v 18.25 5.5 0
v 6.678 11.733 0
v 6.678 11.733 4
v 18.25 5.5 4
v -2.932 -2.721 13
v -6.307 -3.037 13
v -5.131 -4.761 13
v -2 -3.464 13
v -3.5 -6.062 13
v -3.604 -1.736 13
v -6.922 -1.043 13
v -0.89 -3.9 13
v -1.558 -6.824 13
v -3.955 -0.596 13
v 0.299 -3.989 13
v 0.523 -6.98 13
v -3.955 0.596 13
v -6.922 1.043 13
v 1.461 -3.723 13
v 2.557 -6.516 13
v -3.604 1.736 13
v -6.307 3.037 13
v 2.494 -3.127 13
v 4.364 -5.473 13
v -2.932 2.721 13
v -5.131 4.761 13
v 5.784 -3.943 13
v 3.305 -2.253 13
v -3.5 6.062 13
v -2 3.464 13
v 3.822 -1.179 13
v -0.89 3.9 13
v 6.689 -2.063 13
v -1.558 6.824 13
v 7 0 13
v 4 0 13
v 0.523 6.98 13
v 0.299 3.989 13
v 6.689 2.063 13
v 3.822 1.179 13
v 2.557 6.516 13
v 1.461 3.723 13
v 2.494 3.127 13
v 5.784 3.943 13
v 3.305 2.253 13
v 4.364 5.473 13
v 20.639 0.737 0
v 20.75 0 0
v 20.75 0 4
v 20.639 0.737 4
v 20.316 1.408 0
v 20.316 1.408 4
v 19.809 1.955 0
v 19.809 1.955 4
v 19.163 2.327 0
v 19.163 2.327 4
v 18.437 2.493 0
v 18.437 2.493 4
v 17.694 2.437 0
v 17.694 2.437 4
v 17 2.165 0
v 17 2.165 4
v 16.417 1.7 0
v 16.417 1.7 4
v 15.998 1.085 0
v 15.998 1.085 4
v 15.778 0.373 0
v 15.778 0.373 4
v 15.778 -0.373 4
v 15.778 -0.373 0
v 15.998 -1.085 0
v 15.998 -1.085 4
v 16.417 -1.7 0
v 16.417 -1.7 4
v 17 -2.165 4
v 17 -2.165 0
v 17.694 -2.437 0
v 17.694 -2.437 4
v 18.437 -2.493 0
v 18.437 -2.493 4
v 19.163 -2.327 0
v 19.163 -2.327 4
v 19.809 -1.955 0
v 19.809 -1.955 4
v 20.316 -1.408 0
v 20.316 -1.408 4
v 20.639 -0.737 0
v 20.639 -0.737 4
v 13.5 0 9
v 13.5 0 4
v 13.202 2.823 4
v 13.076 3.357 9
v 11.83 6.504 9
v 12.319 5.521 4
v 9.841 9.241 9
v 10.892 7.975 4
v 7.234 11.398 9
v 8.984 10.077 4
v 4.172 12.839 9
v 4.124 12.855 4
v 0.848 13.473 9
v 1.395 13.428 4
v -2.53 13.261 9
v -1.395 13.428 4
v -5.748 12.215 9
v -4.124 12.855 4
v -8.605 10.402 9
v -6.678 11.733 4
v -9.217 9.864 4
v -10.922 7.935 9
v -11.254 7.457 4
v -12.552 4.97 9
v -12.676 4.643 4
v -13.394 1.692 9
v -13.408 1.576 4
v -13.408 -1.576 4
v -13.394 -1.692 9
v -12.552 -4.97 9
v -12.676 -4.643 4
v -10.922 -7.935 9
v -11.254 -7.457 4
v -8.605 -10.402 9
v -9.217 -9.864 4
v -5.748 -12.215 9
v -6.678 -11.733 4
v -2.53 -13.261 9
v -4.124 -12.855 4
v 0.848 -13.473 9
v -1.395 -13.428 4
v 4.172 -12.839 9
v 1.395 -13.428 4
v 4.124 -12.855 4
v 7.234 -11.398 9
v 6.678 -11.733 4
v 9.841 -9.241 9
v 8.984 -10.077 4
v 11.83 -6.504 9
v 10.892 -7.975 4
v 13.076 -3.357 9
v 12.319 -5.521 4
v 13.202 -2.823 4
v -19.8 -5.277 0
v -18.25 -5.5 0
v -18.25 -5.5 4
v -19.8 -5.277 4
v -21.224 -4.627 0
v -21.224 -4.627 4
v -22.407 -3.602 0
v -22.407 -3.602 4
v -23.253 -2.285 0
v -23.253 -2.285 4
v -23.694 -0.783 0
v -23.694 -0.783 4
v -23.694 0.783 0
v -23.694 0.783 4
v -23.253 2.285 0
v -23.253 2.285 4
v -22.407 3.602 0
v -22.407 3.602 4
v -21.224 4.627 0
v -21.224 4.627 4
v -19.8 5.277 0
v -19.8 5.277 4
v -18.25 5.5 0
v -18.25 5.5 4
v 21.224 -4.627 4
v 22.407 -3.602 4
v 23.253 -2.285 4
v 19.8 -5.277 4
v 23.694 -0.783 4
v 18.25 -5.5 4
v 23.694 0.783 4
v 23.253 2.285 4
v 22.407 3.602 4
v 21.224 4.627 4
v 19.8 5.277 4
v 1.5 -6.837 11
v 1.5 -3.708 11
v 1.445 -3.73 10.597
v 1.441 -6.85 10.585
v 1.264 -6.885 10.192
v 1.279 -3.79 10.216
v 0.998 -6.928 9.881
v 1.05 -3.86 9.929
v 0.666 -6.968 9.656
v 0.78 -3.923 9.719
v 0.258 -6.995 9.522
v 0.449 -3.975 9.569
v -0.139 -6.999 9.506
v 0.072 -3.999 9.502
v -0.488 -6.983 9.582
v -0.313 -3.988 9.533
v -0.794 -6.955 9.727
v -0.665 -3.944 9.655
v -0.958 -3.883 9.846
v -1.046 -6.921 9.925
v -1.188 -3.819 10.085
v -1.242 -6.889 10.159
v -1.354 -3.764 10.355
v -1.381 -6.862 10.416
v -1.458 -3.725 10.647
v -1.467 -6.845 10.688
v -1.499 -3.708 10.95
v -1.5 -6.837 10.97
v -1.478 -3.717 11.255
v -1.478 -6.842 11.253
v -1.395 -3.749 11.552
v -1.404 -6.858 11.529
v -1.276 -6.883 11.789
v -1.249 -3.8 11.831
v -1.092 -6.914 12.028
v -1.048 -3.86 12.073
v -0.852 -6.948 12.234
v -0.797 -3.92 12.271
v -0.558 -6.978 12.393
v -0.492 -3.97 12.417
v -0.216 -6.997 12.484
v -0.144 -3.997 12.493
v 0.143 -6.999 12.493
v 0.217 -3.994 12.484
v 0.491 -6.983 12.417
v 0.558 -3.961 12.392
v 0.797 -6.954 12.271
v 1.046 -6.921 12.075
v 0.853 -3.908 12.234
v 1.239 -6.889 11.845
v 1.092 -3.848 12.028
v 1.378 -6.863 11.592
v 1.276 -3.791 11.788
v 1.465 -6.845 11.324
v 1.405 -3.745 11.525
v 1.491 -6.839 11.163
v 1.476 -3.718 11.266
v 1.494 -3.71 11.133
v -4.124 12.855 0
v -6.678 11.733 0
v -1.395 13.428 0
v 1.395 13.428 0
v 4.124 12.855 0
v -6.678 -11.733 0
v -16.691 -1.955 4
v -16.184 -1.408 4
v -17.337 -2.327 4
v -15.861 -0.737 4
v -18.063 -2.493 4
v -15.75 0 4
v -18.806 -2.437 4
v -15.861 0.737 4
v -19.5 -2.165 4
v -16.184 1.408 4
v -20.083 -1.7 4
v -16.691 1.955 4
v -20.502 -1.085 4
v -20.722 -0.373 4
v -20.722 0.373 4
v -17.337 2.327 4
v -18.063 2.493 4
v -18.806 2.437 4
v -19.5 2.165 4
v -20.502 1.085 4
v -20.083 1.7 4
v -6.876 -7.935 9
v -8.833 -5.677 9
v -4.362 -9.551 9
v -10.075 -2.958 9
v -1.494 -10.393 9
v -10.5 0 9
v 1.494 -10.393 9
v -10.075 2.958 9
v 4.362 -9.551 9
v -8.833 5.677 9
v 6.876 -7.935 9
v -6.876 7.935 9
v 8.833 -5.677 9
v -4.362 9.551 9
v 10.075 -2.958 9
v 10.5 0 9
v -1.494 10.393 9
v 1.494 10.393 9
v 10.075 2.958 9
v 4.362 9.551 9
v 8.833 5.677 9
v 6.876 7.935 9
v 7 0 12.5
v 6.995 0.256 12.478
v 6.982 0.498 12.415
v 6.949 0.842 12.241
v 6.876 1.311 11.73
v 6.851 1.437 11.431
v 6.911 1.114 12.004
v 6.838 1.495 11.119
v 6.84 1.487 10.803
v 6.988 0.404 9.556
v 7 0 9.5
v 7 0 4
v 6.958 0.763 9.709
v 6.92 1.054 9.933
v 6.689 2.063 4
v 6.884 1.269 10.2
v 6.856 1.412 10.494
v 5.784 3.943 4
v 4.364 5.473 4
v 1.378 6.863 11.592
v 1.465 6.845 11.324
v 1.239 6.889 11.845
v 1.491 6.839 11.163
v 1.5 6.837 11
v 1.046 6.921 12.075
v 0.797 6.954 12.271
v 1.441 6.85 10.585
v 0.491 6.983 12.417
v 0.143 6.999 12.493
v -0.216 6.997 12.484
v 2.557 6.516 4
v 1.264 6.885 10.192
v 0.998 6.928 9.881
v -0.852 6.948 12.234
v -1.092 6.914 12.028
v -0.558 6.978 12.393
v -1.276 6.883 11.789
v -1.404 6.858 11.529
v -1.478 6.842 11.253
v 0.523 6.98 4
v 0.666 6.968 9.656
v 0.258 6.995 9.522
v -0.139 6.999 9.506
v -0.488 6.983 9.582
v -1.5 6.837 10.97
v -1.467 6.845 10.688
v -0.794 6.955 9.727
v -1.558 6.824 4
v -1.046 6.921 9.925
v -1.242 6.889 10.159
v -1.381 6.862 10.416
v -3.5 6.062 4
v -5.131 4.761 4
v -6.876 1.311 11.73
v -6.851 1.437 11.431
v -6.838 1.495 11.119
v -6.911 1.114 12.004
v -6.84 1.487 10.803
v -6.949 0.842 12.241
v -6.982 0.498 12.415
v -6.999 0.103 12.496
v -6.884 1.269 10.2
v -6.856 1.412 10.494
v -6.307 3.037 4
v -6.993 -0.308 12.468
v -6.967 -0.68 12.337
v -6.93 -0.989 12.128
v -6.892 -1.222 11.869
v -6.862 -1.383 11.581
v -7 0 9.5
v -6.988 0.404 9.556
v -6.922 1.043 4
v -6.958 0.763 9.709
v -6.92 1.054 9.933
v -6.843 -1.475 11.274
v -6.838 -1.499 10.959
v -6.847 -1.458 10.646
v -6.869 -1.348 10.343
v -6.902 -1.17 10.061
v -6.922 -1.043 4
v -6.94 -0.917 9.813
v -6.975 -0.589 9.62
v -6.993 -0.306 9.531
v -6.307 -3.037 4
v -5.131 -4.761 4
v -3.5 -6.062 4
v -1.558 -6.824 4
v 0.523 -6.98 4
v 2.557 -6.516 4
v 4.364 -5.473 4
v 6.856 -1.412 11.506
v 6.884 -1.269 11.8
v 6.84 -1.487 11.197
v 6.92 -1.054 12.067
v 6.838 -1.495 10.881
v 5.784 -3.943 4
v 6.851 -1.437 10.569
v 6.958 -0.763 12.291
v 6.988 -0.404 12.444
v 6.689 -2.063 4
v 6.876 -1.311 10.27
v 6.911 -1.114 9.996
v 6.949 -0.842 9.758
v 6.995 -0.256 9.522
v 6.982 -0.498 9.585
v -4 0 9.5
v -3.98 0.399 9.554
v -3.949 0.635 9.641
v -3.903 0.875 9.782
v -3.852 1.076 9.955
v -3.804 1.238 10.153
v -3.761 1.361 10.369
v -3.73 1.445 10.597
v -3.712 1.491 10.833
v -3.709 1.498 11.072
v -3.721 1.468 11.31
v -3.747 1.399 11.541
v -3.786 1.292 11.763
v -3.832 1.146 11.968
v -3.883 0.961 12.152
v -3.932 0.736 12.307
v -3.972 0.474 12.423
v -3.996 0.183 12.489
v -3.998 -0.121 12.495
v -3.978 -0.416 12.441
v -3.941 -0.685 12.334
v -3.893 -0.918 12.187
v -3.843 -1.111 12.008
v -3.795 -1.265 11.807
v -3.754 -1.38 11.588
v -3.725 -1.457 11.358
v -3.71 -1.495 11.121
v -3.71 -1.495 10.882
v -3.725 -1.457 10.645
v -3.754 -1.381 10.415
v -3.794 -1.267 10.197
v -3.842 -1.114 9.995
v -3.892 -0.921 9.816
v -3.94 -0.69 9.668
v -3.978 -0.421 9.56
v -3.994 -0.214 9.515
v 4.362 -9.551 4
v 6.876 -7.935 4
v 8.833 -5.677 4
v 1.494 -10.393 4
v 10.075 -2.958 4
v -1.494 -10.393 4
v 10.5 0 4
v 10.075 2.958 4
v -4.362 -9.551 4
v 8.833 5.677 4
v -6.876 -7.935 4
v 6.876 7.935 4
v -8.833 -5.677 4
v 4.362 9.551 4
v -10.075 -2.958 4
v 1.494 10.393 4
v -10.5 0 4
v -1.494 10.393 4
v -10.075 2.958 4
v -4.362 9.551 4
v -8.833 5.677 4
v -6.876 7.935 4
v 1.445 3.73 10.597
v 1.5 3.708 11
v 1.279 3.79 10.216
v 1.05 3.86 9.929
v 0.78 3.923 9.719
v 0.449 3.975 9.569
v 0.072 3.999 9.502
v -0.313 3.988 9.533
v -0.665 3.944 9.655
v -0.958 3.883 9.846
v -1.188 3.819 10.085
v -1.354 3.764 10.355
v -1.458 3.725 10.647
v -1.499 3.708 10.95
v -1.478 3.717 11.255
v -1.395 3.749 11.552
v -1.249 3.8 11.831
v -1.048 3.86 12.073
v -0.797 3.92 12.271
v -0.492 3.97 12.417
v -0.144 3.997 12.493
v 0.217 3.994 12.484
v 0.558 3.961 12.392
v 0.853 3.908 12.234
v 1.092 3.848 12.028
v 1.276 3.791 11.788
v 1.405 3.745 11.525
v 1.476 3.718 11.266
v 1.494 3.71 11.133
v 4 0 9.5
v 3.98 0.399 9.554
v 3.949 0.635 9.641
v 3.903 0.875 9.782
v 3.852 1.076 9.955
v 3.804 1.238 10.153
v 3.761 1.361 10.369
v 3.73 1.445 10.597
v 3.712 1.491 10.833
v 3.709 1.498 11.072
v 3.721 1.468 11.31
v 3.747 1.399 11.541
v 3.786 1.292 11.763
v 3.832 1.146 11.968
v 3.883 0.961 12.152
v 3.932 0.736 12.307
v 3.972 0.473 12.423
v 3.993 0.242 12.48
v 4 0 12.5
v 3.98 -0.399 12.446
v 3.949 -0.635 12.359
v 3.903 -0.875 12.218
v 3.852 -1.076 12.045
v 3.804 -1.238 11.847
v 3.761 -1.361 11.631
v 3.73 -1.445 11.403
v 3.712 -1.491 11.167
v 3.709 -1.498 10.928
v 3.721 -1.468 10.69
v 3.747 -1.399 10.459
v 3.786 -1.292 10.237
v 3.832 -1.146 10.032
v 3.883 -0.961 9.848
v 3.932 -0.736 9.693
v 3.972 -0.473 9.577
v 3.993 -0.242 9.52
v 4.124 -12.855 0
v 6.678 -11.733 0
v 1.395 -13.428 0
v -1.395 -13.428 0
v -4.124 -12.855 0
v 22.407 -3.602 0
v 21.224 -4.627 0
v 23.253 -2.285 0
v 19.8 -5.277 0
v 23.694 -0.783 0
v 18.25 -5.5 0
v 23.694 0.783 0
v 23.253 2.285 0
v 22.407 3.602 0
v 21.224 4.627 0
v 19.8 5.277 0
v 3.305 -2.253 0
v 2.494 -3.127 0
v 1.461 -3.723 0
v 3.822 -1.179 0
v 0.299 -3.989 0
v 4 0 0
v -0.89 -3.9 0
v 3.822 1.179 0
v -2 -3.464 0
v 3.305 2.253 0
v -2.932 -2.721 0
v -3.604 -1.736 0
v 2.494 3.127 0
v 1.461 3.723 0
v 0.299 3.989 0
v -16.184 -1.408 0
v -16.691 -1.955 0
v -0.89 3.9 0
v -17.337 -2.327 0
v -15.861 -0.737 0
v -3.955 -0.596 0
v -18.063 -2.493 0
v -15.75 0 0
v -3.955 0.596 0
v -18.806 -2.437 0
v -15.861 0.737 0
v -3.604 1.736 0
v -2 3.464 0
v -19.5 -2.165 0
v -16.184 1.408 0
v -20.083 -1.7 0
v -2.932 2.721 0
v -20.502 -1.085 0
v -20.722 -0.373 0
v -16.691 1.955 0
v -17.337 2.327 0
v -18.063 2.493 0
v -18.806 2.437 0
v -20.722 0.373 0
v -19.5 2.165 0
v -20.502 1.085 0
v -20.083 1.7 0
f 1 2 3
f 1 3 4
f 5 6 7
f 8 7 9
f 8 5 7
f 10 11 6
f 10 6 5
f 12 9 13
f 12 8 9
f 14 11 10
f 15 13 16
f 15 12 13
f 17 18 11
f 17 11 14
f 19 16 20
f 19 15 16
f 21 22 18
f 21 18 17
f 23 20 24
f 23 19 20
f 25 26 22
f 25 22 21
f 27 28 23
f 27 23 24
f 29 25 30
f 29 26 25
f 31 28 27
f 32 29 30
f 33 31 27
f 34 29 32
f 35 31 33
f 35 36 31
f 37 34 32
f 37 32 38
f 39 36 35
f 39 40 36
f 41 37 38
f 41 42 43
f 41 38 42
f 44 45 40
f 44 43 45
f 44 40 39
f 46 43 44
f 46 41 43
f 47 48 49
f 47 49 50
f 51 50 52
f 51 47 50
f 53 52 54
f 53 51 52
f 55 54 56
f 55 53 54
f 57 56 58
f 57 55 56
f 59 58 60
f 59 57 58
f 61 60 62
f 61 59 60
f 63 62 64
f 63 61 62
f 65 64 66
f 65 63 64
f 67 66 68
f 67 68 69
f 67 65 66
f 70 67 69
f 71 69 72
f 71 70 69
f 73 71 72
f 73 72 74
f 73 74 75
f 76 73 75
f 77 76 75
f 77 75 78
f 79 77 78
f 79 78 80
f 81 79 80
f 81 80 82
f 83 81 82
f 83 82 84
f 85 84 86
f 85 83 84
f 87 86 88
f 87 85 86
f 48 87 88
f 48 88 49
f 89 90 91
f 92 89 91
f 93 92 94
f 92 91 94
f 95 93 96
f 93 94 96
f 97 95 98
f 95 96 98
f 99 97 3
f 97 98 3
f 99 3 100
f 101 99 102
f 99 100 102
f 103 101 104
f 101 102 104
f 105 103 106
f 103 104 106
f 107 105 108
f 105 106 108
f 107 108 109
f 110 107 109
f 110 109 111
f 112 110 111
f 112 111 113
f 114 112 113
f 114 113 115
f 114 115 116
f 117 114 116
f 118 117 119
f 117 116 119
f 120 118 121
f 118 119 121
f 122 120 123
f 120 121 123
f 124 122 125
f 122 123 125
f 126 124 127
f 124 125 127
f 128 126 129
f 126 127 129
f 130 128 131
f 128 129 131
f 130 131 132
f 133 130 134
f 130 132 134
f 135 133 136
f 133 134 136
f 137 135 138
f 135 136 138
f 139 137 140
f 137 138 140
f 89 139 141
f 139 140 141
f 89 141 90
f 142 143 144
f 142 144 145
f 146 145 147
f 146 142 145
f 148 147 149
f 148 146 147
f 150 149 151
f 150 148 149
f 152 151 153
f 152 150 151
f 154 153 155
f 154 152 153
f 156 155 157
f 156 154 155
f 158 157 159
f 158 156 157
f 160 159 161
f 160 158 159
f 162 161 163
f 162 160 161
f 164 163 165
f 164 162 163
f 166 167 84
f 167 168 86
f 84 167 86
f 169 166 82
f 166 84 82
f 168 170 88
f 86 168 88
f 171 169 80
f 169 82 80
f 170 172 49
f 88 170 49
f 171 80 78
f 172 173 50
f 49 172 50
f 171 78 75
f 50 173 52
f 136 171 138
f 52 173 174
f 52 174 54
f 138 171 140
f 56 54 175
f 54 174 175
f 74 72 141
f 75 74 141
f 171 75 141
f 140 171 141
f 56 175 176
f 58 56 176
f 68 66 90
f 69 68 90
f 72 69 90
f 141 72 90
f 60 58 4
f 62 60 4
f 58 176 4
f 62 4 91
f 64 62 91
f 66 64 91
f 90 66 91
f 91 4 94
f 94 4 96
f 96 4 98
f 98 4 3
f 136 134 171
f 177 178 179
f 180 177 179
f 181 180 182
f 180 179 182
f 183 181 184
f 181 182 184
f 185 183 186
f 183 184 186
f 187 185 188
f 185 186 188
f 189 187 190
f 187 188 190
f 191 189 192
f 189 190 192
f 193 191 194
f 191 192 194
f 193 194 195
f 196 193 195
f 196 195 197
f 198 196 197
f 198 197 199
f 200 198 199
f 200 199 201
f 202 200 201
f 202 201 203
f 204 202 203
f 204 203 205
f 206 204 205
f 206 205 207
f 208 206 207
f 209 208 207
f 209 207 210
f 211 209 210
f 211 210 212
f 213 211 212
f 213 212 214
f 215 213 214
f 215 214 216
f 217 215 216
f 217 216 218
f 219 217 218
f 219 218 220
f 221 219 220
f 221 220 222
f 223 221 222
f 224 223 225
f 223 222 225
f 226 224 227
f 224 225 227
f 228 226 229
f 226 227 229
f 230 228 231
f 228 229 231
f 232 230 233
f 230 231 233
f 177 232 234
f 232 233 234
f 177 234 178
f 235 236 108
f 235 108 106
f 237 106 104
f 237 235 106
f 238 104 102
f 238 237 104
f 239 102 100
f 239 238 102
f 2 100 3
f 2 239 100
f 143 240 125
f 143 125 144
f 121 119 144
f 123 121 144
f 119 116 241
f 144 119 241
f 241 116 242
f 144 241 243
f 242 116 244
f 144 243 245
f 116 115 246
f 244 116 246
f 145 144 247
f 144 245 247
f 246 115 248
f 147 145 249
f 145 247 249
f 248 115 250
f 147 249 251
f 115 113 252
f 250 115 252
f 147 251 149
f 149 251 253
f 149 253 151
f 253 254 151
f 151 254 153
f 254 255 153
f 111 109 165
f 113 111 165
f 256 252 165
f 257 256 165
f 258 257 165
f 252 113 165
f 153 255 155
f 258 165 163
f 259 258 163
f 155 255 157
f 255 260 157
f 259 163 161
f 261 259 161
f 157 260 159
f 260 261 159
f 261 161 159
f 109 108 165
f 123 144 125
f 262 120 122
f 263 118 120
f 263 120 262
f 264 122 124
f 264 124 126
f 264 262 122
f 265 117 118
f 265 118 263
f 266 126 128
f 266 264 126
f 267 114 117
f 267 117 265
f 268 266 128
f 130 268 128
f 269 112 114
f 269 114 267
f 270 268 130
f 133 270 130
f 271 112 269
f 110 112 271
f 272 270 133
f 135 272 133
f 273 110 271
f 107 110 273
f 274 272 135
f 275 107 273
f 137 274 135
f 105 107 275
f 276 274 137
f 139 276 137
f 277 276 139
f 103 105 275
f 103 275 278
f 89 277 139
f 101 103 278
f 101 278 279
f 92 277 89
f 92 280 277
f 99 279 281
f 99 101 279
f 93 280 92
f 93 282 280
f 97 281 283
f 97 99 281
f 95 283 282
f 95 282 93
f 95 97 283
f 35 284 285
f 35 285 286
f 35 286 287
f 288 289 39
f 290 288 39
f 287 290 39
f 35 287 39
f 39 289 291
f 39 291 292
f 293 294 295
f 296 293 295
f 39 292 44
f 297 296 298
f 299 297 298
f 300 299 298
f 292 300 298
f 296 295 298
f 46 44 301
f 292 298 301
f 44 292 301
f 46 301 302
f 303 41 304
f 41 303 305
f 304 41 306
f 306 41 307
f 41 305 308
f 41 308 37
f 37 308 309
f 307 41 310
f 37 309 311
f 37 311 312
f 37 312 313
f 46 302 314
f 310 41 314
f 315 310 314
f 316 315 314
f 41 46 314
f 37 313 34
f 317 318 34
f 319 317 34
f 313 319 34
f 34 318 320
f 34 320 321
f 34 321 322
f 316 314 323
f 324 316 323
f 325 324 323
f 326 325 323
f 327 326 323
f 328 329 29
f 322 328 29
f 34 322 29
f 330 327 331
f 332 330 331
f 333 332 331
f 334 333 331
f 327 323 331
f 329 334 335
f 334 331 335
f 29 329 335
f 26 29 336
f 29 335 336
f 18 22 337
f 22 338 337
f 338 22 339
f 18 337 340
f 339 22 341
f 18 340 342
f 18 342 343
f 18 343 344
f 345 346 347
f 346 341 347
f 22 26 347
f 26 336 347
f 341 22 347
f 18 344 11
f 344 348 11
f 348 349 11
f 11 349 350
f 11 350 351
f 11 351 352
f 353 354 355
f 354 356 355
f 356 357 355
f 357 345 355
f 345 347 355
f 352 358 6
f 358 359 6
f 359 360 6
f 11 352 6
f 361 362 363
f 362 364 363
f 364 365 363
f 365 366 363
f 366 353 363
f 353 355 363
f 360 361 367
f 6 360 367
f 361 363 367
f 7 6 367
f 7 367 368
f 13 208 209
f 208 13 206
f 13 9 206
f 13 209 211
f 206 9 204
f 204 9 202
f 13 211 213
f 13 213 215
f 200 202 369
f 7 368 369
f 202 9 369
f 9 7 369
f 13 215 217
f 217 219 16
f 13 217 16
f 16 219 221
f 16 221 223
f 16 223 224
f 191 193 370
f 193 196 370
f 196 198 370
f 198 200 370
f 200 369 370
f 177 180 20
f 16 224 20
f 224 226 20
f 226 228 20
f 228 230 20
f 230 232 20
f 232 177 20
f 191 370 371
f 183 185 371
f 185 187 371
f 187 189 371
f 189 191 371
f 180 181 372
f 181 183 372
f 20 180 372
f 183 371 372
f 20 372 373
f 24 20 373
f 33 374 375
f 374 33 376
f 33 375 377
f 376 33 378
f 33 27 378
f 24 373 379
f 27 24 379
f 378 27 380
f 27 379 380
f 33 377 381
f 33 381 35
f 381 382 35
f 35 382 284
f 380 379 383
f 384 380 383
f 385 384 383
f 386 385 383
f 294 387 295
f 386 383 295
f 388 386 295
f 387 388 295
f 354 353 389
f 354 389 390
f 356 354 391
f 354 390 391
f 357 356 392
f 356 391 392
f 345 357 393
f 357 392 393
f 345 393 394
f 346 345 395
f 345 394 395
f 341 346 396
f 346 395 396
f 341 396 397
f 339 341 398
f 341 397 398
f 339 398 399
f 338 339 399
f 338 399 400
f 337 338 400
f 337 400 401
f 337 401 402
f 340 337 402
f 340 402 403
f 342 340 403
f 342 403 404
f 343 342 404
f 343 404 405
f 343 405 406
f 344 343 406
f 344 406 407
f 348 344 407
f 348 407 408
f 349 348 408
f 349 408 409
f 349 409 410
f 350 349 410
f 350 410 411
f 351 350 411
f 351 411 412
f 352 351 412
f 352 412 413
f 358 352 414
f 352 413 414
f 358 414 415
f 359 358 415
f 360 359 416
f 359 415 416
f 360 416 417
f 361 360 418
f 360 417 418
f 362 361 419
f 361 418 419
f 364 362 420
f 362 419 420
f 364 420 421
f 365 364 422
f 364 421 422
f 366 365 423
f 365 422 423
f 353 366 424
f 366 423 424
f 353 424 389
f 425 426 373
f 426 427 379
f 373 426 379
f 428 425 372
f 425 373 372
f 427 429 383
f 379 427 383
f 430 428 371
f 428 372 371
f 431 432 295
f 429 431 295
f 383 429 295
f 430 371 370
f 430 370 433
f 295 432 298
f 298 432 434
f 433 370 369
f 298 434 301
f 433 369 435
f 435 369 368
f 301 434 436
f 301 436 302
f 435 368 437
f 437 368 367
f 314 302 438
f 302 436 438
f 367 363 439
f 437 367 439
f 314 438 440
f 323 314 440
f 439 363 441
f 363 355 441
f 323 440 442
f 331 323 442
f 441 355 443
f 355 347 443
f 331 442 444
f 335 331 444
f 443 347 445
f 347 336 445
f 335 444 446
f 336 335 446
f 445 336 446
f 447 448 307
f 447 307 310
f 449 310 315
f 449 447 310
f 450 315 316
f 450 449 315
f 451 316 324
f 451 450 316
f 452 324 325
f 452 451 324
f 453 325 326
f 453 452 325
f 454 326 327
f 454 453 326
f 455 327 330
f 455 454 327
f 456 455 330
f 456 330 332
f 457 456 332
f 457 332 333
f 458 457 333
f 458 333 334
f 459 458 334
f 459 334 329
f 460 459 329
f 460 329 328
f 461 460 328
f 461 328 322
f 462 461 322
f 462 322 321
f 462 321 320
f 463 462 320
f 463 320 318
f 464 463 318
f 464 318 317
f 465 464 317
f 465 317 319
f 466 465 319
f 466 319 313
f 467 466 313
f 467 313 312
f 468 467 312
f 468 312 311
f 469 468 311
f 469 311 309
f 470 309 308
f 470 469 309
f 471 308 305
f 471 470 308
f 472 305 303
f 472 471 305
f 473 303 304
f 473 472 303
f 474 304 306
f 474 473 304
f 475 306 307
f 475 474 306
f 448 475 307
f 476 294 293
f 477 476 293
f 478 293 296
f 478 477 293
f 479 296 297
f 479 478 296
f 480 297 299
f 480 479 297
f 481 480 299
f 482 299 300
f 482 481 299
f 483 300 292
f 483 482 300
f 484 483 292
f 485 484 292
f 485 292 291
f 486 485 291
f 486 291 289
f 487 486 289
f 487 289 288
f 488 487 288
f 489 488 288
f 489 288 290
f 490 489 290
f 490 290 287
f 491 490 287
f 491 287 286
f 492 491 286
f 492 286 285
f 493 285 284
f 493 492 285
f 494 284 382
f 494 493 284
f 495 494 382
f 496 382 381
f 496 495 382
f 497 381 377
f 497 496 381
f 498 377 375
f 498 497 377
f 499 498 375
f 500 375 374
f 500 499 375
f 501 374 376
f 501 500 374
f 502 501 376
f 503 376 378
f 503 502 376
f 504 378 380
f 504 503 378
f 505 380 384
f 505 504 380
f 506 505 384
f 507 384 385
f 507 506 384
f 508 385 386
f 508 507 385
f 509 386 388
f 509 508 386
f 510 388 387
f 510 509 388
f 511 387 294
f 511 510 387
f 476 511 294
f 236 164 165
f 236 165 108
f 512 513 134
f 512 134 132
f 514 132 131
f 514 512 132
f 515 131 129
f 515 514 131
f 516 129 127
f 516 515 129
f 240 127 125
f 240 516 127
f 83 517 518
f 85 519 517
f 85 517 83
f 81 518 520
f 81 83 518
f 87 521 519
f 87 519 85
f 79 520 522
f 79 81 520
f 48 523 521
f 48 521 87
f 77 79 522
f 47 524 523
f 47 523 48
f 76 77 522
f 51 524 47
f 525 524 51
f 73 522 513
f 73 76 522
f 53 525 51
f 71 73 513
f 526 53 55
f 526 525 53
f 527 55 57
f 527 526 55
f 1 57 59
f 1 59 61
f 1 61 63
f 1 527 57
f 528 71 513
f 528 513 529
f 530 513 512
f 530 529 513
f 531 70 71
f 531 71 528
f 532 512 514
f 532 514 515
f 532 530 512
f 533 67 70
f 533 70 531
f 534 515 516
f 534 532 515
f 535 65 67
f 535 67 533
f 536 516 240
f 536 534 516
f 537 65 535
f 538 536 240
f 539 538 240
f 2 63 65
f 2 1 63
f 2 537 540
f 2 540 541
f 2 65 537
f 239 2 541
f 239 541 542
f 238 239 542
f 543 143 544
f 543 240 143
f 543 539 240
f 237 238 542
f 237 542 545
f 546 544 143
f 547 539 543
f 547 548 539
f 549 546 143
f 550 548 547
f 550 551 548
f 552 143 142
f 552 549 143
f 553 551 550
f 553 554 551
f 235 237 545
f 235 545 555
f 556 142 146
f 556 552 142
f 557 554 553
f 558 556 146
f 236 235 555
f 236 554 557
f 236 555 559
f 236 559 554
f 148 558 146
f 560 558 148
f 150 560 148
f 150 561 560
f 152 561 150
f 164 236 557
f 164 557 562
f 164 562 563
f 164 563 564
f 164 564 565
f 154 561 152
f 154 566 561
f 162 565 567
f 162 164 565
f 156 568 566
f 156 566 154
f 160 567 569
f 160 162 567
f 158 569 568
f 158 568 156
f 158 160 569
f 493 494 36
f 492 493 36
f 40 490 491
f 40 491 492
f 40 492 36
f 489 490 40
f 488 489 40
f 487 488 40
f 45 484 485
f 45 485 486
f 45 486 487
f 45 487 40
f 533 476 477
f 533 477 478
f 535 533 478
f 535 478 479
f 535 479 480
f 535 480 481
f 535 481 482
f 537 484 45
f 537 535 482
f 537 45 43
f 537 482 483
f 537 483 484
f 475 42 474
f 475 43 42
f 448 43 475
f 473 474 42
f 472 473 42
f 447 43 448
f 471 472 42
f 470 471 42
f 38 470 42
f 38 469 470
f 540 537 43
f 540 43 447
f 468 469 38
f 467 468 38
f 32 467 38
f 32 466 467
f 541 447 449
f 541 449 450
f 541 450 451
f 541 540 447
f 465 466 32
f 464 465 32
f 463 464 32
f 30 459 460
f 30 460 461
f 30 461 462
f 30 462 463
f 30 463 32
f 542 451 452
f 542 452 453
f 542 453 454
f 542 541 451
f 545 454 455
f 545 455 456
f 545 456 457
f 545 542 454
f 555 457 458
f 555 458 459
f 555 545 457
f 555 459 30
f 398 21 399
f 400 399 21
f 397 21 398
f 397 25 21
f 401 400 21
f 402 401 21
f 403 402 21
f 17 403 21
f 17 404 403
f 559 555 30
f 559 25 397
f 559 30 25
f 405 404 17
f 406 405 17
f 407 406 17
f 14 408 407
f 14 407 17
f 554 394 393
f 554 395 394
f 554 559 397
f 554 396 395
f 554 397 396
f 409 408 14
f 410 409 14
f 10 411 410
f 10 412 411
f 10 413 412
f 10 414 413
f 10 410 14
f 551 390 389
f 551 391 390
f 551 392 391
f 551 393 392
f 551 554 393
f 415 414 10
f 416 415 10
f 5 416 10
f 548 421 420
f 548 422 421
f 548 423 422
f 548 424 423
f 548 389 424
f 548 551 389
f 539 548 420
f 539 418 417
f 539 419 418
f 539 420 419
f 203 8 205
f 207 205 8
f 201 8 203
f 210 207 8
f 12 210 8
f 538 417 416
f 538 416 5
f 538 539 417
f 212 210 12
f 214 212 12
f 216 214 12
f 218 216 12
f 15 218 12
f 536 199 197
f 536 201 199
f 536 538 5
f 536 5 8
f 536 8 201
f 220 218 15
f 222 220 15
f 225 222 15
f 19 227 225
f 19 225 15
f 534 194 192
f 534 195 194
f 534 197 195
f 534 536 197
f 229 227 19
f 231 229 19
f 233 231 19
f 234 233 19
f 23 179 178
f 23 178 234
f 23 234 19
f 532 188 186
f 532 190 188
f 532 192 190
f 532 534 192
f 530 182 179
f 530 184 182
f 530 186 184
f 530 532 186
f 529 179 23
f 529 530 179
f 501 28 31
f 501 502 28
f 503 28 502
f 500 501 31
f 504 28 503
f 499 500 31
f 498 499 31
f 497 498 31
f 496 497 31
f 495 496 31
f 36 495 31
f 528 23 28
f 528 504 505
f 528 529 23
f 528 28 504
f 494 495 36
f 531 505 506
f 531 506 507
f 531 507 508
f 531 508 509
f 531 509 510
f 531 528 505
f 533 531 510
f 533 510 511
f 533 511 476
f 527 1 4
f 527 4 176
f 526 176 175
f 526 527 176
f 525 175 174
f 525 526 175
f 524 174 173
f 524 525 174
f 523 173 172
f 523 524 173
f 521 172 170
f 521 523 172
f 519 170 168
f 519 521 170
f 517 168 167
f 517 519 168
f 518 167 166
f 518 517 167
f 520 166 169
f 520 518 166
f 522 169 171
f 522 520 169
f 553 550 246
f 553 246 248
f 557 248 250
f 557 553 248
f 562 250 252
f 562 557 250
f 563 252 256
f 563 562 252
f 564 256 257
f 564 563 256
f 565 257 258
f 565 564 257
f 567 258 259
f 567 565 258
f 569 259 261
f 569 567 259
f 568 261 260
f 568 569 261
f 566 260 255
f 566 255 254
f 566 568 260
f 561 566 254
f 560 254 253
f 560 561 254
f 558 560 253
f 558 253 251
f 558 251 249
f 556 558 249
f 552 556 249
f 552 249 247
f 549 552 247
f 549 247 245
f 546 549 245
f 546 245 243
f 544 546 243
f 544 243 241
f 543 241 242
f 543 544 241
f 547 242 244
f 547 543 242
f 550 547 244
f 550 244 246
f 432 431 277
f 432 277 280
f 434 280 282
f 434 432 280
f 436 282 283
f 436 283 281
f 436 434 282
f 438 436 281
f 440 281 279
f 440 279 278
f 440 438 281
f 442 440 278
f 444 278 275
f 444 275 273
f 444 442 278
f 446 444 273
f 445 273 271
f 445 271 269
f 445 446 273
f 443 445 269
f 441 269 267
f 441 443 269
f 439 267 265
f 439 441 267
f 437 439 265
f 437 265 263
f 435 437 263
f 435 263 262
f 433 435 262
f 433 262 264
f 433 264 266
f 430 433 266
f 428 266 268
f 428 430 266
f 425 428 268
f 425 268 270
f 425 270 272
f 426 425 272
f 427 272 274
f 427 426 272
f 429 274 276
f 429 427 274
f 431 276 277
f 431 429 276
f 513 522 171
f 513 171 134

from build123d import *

# Parameters (mm, degrees)
ESBO_O1_R                  = 2.5
ESBO_O1_R_2                = 4
RESSALTO_EXTRUS_O1_DEPTH   = 4
ESBO_O2_R                  = 13.5
ESBO_O2_R_2                = 10.5
RESSALTO_EXTRUS_O2_DEPTH   = 5
ESBO_O3_R                  = 7
ESBO_O3_R_2                = 4
RESSALTO_EXTRUS_O3_DEPTH   = 9
ESBO_O4_R                  = 1.5
CORTE_EXTRUS_O1_DEPTH      = 14.5
CORTE_EXTRUS_O1_DEPTH_BACK = 14.5
ESBO_O5_R                  = 1.5
CORTE_EXTRUS_O2_DEPTH      = 24.75
CORTE_EXTRUS_O2_DEPTH_BACK = 24.75


with BuildPart() as part:
    # Esboço1 → Ressalto-extrusão1 (new body)
    with BuildSketch(Plane.XY):
        with BuildLine():
            Line((-18.25, 5.5), (-6.677721963, 11.73277586))
            ThreePointArc((-6.677721963, 11.73277586), (0, 13.5), (6.677721963, 11.73277586))
            Line((6.677721963, 11.73277586), (18.25, 5.5))
            ThreePointArc((18.25, 5.5), (23.75, 0), (18.25, -5.5))
            Line((18.25, -5.5), (6.677721963, -11.73277586))
            ThreePointArc((6.677721963, -11.73277586), (0, -13.5), (-6.677721963, -11.73277586))
            Line((-6.677721963, -11.73277586), (-18.25, -5.5))
            ThreePointArc((-18.25, -5.5), (-23.75, 0), (-18.25, 5.5))
        make_face()
        with Locations((-18.25, 0)):
            Circle(ESBO_O1_R, mode=Mode.SUBTRACT)
        with Locations((18.25, 0)):
            Circle(ESBO_O1_R, mode=Mode.SUBTRACT)
        Circle(ESBO_O1_R_2, mode=Mode.SUBTRACT)
    extrude(amount=RESSALTO_EXTRUS_O1_DEPTH)

    # Esboço2 → Ressalto-extrusão2 (add)
    with BuildSketch(Plane.XY.offset(4)):
        Circle(ESBO_O2_R)
        Circle(ESBO_O2_R_2, mode=Mode.SUBTRACT)
    extrude(amount=RESSALTO_EXTRUS_O2_DEPTH)

    # Esboço3 → Ressalto-extrusão3 (add)
    with BuildSketch(Plane.XY.offset(4)):
        Circle(ESBO_O3_R)
        Circle(ESBO_O3_R_2, mode=Mode.SUBTRACT)
    extrude(amount=RESSALTO_EXTRUS_O3_DEPTH)

    # Esboço4 → Corte-extrusão1 (cut, two sides)
    with BuildSketch(Plane(origin=(0, 0, 0), x_dir=(1, 0, 0), z_dir=(0, 1, 0))) as corte_extrus_o1_sk:
        with Locations((0, -11)):
            Circle(ESBO_O4_R)
    extrude(amount=CORTE_EXTRUS_O1_DEPTH, mode=Mode.SUBTRACT)
    extrude(corte_extrus_o1_sk.sketch, amount=-CORTE_EXTRUS_O1_DEPTH_BACK, mode=Mode.SUBTRACT)

    # Esboço5 → Corte-extrusão2 (cut, two sides)
    with BuildSketch(Plane(origin=(0, 0, 0), x_dir=(0, 0, -1), z_dir=(1, 0, 0))) as corte_extrus_o2_sk:
        with Locations((-11, 0)):
            Circle(ESBO_O5_R)
    extrude(amount=CORTE_EXTRUS_O2_DEPTH, mode=Mode.SUBTRACT)
    extrude(corte_extrus_o2_sk.sketch, amount=-CORTE_EXTRUS_O2_DEPTH_BACK, mode=Mode.SUBTRACT)


solid = part.part
